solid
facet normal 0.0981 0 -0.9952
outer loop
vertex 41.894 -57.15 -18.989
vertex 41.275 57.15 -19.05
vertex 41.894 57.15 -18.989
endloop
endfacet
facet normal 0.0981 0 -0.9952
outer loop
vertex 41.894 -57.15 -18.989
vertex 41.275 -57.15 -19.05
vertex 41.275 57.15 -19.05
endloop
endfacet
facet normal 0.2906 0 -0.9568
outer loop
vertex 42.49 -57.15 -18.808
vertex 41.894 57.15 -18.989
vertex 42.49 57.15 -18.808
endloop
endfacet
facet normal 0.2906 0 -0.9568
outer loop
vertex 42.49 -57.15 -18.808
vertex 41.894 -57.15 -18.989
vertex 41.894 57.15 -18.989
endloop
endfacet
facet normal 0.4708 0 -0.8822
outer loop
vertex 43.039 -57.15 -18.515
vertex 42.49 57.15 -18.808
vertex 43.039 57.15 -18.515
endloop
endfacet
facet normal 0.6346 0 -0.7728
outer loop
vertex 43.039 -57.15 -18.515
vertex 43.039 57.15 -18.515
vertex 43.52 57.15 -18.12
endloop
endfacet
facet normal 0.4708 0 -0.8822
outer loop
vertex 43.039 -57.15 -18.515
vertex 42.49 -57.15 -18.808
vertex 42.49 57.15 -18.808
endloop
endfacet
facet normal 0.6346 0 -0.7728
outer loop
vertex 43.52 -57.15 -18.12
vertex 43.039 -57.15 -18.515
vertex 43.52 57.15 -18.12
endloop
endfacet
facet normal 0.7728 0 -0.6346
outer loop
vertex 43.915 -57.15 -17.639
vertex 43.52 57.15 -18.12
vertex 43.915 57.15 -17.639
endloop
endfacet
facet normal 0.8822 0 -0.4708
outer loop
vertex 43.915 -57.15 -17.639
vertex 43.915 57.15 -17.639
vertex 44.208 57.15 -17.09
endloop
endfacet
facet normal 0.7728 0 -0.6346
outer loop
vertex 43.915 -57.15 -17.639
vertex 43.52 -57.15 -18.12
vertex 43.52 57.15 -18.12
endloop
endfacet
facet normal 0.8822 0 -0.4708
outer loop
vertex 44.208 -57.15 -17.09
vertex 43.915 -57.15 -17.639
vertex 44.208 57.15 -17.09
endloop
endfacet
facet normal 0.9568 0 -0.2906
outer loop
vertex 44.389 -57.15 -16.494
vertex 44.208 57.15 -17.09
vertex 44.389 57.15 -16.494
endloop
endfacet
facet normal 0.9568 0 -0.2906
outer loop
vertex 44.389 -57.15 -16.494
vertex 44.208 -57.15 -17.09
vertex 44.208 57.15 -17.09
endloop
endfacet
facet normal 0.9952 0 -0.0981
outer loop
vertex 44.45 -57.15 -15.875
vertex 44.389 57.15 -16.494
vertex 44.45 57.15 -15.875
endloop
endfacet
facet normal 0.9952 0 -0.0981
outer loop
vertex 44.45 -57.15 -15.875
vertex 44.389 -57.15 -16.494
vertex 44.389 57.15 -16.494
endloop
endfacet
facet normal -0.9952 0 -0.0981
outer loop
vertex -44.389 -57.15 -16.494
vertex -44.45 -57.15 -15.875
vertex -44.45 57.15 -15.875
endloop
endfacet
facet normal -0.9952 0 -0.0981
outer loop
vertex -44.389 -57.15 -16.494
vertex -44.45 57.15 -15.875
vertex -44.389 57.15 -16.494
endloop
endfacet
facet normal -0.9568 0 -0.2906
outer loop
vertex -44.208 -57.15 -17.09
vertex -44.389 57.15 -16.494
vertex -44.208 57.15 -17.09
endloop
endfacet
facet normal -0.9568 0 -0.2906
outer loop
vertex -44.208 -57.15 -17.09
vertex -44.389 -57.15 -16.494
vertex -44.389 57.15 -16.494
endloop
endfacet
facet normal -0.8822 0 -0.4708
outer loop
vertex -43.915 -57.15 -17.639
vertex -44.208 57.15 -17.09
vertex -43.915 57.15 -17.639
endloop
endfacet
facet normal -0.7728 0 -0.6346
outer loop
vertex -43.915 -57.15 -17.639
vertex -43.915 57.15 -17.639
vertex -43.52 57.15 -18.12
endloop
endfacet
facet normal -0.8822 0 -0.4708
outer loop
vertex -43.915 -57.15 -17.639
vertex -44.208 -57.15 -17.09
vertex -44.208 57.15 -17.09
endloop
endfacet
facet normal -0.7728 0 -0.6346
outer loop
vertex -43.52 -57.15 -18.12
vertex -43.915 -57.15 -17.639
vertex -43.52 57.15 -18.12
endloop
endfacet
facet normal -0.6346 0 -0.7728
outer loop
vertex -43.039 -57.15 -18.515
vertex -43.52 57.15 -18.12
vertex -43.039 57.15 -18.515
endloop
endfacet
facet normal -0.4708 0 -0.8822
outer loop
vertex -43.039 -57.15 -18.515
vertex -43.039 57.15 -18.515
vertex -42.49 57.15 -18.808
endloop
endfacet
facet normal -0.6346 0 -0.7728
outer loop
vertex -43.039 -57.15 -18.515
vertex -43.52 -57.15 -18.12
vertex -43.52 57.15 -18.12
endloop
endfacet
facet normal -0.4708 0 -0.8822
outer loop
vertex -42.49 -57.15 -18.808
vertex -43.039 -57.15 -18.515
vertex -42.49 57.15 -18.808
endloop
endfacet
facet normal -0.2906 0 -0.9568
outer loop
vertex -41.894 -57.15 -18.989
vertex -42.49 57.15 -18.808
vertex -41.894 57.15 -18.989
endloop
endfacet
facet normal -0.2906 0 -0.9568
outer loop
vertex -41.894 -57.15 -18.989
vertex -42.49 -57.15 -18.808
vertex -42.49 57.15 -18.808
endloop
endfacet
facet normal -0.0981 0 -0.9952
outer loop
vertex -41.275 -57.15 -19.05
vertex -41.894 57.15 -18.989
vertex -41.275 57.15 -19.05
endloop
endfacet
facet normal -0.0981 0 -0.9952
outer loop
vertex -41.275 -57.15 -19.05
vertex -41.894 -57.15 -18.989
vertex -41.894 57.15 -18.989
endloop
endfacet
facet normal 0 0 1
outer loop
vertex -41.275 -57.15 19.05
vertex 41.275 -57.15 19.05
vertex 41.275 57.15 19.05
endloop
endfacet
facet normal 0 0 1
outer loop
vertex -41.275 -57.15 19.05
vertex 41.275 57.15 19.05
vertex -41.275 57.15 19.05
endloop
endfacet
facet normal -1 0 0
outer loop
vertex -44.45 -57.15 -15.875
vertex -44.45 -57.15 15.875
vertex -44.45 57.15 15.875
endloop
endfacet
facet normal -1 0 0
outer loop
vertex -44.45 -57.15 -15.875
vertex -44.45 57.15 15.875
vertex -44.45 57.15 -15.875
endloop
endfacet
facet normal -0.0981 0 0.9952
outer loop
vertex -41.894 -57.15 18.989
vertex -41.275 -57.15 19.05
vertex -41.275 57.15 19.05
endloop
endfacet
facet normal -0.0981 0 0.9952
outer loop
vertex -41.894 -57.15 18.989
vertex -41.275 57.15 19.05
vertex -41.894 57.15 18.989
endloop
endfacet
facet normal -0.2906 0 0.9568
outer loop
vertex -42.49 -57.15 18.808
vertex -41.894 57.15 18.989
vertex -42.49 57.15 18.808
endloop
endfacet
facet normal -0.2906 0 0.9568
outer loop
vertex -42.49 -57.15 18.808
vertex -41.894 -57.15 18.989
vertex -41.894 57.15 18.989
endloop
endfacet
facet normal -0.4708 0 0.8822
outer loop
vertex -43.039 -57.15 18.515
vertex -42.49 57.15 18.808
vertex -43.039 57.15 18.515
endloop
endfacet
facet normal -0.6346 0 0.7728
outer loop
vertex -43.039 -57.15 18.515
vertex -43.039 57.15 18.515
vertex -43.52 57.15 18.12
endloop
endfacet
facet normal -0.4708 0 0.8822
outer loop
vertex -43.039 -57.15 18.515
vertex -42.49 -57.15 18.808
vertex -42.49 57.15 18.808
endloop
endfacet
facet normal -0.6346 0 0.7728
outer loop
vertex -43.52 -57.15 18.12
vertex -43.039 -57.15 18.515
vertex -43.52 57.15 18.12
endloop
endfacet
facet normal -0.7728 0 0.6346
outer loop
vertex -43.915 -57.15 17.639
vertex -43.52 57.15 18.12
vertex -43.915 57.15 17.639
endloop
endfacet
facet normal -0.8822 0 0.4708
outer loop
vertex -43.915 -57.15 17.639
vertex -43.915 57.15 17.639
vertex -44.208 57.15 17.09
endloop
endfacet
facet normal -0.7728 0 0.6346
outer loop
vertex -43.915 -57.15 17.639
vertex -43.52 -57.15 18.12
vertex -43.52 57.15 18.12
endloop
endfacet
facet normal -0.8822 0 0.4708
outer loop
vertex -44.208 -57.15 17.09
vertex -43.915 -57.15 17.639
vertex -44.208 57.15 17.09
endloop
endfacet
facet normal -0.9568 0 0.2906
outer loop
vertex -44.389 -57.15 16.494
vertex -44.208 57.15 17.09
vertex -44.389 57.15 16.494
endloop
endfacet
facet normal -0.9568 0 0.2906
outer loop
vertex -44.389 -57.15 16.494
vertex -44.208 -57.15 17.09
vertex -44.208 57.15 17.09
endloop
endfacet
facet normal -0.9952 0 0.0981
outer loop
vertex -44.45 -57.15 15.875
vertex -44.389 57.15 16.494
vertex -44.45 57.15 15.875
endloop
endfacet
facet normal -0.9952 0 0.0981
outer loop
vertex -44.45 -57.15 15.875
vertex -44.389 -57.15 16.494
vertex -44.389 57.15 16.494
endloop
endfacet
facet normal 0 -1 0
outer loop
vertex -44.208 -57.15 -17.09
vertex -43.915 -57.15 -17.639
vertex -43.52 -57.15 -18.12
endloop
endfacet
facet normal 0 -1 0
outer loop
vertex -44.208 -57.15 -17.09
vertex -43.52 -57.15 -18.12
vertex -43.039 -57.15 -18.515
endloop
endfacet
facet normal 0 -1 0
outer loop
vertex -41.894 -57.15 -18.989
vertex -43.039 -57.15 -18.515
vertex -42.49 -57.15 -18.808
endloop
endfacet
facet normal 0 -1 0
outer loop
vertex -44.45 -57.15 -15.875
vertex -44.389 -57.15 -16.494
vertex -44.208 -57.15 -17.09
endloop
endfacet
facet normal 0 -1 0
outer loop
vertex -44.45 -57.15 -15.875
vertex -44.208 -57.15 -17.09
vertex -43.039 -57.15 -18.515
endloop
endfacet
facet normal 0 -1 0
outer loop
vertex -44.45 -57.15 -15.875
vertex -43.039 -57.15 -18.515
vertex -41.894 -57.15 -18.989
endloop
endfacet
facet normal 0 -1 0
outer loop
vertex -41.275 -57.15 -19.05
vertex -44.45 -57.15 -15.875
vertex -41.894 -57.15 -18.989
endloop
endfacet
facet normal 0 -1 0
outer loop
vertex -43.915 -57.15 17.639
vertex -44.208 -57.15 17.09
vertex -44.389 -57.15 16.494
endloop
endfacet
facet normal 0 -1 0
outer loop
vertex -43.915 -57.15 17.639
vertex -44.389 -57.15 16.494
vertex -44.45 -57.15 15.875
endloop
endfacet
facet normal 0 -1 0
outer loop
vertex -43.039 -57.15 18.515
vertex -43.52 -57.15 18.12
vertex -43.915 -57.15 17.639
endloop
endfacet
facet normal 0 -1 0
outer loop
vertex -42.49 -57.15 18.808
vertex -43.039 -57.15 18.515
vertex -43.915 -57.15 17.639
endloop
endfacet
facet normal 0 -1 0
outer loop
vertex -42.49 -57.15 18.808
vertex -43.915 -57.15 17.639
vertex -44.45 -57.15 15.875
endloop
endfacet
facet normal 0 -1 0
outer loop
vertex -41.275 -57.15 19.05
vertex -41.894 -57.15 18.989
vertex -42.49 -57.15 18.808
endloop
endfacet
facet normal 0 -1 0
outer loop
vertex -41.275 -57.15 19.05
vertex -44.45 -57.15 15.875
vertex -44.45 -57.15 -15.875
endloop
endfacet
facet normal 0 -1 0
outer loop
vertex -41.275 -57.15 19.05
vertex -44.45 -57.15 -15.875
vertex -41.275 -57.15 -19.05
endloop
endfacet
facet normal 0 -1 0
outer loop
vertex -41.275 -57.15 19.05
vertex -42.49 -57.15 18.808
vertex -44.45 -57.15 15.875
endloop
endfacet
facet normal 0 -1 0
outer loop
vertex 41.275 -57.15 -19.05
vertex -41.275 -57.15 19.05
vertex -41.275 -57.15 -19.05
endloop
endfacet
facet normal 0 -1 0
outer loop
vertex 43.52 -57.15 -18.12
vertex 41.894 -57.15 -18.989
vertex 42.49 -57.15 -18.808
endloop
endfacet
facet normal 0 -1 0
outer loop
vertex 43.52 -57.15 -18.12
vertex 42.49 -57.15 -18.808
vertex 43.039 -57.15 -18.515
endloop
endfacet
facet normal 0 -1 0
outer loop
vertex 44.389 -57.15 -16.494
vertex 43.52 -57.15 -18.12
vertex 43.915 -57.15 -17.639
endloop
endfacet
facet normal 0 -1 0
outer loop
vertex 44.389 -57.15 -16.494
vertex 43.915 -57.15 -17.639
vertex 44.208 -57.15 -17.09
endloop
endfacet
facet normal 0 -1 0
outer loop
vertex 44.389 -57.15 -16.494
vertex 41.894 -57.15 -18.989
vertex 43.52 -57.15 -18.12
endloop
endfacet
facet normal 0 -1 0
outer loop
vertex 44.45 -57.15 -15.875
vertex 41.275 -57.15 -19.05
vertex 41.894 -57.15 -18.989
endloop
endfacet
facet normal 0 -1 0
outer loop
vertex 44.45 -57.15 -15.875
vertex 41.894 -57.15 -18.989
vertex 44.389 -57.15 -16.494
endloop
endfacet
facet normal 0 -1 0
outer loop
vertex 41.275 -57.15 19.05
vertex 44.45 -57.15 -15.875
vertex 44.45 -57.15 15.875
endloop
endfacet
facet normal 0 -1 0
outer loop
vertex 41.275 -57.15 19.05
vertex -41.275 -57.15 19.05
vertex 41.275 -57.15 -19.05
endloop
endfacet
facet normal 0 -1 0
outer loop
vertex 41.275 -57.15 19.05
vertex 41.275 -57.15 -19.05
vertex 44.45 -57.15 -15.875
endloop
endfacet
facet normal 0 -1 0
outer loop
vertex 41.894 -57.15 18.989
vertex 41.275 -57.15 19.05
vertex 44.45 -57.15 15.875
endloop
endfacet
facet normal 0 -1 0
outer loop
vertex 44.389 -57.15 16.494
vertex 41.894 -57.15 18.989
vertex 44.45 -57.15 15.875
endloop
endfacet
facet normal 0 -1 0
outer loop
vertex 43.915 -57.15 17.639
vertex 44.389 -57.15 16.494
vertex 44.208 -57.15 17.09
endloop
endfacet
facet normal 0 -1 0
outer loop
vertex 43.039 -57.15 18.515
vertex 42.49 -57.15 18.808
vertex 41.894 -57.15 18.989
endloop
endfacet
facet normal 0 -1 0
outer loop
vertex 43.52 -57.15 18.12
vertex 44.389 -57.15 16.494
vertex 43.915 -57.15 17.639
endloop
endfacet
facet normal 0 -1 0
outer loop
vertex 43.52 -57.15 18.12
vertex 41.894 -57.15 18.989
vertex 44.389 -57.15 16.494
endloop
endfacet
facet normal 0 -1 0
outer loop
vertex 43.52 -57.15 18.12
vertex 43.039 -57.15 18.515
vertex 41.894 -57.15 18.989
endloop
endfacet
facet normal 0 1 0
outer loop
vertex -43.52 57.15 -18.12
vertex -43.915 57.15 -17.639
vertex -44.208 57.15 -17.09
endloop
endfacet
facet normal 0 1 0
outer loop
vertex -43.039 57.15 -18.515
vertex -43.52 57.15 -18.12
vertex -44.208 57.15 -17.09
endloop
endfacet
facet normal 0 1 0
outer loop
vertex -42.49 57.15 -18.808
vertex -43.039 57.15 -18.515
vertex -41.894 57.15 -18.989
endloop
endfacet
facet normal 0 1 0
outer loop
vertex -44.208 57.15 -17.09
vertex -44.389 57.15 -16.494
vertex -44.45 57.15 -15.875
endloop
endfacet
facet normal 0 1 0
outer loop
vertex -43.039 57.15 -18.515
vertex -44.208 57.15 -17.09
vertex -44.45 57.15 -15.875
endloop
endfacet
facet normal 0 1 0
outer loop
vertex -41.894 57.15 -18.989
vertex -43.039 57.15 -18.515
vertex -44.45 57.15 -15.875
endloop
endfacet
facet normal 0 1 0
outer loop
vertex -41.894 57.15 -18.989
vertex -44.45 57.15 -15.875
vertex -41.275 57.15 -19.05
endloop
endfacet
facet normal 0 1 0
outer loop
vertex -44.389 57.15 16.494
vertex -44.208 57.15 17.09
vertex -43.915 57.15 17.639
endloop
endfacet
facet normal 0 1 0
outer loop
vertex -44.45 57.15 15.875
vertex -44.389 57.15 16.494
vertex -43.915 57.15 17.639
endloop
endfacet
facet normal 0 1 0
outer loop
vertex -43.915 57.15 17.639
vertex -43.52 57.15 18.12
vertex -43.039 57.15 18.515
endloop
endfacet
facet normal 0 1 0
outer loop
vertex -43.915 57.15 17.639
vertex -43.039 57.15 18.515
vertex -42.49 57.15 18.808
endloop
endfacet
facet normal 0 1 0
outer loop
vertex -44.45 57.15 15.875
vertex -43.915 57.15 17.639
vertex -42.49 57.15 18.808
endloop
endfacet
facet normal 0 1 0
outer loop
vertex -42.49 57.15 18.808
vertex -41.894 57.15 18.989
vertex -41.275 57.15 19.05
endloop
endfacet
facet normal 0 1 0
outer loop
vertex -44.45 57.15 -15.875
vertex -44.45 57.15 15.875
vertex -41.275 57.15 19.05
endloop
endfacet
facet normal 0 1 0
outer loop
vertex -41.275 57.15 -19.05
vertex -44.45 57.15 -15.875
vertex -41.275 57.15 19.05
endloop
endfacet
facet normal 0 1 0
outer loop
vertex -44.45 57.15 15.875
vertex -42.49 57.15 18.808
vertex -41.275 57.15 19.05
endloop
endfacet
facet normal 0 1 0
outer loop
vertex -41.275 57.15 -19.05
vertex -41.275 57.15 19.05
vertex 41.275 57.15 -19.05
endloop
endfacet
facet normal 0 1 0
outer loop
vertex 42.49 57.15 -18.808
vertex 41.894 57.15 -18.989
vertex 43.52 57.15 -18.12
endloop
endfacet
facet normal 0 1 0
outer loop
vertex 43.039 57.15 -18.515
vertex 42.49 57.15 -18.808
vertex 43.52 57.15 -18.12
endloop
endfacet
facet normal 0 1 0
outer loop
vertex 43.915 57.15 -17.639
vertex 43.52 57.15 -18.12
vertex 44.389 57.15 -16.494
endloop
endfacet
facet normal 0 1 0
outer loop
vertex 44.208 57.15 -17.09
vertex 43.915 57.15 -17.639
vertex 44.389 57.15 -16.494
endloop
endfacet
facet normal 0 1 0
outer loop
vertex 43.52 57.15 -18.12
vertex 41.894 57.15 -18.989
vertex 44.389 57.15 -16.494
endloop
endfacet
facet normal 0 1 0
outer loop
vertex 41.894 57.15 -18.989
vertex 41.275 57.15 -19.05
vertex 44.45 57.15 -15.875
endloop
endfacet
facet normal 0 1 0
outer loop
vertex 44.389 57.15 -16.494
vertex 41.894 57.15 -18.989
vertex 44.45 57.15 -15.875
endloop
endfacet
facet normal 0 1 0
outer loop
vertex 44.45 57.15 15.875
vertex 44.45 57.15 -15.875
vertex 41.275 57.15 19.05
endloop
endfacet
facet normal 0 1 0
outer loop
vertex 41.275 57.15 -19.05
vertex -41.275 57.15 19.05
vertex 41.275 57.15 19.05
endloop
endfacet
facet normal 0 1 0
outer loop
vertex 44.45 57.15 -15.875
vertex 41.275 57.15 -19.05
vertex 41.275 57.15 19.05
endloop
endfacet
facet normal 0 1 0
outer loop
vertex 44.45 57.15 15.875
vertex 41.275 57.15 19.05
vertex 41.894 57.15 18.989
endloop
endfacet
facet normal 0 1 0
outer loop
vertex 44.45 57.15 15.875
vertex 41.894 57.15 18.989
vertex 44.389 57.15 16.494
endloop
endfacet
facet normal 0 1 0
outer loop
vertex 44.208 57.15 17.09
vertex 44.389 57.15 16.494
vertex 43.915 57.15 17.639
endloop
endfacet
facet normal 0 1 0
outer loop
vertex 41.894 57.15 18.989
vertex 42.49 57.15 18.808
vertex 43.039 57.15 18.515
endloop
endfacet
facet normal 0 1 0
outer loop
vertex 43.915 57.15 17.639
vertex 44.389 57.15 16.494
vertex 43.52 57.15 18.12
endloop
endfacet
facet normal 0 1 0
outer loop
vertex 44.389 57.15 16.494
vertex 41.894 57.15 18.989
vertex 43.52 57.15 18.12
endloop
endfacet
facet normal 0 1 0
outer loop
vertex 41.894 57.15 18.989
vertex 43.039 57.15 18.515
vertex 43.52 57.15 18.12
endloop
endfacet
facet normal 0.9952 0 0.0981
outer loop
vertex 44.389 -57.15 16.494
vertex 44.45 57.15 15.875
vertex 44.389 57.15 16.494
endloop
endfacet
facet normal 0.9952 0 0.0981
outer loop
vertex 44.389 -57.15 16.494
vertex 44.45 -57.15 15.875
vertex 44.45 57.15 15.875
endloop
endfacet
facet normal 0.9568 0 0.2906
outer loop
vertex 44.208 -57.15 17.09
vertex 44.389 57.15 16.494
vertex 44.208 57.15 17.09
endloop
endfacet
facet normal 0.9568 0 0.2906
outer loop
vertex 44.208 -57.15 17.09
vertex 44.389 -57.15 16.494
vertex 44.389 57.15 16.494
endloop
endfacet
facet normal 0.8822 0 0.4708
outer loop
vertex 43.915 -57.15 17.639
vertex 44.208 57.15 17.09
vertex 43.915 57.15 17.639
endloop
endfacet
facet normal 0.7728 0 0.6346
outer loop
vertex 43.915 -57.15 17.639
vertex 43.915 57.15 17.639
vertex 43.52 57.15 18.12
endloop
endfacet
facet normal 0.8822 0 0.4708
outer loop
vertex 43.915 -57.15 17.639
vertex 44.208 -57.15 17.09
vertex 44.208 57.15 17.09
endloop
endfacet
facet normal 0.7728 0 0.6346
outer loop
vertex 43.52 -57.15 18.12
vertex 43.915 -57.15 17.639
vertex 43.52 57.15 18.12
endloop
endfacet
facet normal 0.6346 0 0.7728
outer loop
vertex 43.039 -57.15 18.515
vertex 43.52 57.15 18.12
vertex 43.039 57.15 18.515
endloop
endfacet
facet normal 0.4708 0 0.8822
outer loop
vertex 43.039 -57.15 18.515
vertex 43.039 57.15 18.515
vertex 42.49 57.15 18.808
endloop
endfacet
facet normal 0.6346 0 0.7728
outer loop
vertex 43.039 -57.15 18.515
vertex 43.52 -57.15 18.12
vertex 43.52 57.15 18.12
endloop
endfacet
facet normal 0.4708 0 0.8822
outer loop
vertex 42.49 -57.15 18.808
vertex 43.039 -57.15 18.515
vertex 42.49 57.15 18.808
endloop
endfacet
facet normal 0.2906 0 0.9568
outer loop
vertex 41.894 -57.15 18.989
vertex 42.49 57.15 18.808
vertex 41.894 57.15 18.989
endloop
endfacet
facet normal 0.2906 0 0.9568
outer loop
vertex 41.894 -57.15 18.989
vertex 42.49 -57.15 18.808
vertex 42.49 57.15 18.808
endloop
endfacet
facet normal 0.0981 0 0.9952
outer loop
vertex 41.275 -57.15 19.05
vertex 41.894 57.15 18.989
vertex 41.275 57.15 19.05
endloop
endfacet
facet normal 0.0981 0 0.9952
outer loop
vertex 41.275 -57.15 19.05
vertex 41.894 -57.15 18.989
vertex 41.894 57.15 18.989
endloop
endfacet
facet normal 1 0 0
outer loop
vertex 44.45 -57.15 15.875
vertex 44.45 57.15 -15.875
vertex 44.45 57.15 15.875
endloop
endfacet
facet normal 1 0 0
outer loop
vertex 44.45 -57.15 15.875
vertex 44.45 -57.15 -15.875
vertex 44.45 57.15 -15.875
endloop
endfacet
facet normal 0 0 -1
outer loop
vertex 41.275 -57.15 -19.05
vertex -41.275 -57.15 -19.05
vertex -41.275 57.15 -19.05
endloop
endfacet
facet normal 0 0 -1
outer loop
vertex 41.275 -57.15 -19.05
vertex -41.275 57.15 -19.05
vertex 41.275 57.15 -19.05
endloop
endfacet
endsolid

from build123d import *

# Parameters (mm, degrees)
F1_DEPTH = 57.15


with BuildPart() as f1:
    # F0 (on Front) → F1 (new body, symmetric)
    with BuildSketch(Plane.XZ):
        with BuildLine():
            ThreePointArc((44.45, 15.875), (43.520064, 18.120064), (41.275, 19.05))
            Line((41.275, 19.05), (-41.275, 19.05))
            ThreePointArc((-41.275, 19.05), (-43.520064, 18.120064), (-44.45, 15.875))
            Line((-44.45, 15.875), (-44.45, -15.875))
            ThreePointArc((-44.45, -15.875), (-43.520064, -18.120064), (-41.275, -19.05))
            Line((-41.275, -19.05), (41.275, -19.05))
            ThreePointArc((41.275, -19.05), (43.520064, -18.120064), (44.45, -15.875))
            Line((44.45, -15.875), (44.45, 15.875))
        make_face()
    extrude(amount=F1_DEPTH, both=True)


solid = f1.part
